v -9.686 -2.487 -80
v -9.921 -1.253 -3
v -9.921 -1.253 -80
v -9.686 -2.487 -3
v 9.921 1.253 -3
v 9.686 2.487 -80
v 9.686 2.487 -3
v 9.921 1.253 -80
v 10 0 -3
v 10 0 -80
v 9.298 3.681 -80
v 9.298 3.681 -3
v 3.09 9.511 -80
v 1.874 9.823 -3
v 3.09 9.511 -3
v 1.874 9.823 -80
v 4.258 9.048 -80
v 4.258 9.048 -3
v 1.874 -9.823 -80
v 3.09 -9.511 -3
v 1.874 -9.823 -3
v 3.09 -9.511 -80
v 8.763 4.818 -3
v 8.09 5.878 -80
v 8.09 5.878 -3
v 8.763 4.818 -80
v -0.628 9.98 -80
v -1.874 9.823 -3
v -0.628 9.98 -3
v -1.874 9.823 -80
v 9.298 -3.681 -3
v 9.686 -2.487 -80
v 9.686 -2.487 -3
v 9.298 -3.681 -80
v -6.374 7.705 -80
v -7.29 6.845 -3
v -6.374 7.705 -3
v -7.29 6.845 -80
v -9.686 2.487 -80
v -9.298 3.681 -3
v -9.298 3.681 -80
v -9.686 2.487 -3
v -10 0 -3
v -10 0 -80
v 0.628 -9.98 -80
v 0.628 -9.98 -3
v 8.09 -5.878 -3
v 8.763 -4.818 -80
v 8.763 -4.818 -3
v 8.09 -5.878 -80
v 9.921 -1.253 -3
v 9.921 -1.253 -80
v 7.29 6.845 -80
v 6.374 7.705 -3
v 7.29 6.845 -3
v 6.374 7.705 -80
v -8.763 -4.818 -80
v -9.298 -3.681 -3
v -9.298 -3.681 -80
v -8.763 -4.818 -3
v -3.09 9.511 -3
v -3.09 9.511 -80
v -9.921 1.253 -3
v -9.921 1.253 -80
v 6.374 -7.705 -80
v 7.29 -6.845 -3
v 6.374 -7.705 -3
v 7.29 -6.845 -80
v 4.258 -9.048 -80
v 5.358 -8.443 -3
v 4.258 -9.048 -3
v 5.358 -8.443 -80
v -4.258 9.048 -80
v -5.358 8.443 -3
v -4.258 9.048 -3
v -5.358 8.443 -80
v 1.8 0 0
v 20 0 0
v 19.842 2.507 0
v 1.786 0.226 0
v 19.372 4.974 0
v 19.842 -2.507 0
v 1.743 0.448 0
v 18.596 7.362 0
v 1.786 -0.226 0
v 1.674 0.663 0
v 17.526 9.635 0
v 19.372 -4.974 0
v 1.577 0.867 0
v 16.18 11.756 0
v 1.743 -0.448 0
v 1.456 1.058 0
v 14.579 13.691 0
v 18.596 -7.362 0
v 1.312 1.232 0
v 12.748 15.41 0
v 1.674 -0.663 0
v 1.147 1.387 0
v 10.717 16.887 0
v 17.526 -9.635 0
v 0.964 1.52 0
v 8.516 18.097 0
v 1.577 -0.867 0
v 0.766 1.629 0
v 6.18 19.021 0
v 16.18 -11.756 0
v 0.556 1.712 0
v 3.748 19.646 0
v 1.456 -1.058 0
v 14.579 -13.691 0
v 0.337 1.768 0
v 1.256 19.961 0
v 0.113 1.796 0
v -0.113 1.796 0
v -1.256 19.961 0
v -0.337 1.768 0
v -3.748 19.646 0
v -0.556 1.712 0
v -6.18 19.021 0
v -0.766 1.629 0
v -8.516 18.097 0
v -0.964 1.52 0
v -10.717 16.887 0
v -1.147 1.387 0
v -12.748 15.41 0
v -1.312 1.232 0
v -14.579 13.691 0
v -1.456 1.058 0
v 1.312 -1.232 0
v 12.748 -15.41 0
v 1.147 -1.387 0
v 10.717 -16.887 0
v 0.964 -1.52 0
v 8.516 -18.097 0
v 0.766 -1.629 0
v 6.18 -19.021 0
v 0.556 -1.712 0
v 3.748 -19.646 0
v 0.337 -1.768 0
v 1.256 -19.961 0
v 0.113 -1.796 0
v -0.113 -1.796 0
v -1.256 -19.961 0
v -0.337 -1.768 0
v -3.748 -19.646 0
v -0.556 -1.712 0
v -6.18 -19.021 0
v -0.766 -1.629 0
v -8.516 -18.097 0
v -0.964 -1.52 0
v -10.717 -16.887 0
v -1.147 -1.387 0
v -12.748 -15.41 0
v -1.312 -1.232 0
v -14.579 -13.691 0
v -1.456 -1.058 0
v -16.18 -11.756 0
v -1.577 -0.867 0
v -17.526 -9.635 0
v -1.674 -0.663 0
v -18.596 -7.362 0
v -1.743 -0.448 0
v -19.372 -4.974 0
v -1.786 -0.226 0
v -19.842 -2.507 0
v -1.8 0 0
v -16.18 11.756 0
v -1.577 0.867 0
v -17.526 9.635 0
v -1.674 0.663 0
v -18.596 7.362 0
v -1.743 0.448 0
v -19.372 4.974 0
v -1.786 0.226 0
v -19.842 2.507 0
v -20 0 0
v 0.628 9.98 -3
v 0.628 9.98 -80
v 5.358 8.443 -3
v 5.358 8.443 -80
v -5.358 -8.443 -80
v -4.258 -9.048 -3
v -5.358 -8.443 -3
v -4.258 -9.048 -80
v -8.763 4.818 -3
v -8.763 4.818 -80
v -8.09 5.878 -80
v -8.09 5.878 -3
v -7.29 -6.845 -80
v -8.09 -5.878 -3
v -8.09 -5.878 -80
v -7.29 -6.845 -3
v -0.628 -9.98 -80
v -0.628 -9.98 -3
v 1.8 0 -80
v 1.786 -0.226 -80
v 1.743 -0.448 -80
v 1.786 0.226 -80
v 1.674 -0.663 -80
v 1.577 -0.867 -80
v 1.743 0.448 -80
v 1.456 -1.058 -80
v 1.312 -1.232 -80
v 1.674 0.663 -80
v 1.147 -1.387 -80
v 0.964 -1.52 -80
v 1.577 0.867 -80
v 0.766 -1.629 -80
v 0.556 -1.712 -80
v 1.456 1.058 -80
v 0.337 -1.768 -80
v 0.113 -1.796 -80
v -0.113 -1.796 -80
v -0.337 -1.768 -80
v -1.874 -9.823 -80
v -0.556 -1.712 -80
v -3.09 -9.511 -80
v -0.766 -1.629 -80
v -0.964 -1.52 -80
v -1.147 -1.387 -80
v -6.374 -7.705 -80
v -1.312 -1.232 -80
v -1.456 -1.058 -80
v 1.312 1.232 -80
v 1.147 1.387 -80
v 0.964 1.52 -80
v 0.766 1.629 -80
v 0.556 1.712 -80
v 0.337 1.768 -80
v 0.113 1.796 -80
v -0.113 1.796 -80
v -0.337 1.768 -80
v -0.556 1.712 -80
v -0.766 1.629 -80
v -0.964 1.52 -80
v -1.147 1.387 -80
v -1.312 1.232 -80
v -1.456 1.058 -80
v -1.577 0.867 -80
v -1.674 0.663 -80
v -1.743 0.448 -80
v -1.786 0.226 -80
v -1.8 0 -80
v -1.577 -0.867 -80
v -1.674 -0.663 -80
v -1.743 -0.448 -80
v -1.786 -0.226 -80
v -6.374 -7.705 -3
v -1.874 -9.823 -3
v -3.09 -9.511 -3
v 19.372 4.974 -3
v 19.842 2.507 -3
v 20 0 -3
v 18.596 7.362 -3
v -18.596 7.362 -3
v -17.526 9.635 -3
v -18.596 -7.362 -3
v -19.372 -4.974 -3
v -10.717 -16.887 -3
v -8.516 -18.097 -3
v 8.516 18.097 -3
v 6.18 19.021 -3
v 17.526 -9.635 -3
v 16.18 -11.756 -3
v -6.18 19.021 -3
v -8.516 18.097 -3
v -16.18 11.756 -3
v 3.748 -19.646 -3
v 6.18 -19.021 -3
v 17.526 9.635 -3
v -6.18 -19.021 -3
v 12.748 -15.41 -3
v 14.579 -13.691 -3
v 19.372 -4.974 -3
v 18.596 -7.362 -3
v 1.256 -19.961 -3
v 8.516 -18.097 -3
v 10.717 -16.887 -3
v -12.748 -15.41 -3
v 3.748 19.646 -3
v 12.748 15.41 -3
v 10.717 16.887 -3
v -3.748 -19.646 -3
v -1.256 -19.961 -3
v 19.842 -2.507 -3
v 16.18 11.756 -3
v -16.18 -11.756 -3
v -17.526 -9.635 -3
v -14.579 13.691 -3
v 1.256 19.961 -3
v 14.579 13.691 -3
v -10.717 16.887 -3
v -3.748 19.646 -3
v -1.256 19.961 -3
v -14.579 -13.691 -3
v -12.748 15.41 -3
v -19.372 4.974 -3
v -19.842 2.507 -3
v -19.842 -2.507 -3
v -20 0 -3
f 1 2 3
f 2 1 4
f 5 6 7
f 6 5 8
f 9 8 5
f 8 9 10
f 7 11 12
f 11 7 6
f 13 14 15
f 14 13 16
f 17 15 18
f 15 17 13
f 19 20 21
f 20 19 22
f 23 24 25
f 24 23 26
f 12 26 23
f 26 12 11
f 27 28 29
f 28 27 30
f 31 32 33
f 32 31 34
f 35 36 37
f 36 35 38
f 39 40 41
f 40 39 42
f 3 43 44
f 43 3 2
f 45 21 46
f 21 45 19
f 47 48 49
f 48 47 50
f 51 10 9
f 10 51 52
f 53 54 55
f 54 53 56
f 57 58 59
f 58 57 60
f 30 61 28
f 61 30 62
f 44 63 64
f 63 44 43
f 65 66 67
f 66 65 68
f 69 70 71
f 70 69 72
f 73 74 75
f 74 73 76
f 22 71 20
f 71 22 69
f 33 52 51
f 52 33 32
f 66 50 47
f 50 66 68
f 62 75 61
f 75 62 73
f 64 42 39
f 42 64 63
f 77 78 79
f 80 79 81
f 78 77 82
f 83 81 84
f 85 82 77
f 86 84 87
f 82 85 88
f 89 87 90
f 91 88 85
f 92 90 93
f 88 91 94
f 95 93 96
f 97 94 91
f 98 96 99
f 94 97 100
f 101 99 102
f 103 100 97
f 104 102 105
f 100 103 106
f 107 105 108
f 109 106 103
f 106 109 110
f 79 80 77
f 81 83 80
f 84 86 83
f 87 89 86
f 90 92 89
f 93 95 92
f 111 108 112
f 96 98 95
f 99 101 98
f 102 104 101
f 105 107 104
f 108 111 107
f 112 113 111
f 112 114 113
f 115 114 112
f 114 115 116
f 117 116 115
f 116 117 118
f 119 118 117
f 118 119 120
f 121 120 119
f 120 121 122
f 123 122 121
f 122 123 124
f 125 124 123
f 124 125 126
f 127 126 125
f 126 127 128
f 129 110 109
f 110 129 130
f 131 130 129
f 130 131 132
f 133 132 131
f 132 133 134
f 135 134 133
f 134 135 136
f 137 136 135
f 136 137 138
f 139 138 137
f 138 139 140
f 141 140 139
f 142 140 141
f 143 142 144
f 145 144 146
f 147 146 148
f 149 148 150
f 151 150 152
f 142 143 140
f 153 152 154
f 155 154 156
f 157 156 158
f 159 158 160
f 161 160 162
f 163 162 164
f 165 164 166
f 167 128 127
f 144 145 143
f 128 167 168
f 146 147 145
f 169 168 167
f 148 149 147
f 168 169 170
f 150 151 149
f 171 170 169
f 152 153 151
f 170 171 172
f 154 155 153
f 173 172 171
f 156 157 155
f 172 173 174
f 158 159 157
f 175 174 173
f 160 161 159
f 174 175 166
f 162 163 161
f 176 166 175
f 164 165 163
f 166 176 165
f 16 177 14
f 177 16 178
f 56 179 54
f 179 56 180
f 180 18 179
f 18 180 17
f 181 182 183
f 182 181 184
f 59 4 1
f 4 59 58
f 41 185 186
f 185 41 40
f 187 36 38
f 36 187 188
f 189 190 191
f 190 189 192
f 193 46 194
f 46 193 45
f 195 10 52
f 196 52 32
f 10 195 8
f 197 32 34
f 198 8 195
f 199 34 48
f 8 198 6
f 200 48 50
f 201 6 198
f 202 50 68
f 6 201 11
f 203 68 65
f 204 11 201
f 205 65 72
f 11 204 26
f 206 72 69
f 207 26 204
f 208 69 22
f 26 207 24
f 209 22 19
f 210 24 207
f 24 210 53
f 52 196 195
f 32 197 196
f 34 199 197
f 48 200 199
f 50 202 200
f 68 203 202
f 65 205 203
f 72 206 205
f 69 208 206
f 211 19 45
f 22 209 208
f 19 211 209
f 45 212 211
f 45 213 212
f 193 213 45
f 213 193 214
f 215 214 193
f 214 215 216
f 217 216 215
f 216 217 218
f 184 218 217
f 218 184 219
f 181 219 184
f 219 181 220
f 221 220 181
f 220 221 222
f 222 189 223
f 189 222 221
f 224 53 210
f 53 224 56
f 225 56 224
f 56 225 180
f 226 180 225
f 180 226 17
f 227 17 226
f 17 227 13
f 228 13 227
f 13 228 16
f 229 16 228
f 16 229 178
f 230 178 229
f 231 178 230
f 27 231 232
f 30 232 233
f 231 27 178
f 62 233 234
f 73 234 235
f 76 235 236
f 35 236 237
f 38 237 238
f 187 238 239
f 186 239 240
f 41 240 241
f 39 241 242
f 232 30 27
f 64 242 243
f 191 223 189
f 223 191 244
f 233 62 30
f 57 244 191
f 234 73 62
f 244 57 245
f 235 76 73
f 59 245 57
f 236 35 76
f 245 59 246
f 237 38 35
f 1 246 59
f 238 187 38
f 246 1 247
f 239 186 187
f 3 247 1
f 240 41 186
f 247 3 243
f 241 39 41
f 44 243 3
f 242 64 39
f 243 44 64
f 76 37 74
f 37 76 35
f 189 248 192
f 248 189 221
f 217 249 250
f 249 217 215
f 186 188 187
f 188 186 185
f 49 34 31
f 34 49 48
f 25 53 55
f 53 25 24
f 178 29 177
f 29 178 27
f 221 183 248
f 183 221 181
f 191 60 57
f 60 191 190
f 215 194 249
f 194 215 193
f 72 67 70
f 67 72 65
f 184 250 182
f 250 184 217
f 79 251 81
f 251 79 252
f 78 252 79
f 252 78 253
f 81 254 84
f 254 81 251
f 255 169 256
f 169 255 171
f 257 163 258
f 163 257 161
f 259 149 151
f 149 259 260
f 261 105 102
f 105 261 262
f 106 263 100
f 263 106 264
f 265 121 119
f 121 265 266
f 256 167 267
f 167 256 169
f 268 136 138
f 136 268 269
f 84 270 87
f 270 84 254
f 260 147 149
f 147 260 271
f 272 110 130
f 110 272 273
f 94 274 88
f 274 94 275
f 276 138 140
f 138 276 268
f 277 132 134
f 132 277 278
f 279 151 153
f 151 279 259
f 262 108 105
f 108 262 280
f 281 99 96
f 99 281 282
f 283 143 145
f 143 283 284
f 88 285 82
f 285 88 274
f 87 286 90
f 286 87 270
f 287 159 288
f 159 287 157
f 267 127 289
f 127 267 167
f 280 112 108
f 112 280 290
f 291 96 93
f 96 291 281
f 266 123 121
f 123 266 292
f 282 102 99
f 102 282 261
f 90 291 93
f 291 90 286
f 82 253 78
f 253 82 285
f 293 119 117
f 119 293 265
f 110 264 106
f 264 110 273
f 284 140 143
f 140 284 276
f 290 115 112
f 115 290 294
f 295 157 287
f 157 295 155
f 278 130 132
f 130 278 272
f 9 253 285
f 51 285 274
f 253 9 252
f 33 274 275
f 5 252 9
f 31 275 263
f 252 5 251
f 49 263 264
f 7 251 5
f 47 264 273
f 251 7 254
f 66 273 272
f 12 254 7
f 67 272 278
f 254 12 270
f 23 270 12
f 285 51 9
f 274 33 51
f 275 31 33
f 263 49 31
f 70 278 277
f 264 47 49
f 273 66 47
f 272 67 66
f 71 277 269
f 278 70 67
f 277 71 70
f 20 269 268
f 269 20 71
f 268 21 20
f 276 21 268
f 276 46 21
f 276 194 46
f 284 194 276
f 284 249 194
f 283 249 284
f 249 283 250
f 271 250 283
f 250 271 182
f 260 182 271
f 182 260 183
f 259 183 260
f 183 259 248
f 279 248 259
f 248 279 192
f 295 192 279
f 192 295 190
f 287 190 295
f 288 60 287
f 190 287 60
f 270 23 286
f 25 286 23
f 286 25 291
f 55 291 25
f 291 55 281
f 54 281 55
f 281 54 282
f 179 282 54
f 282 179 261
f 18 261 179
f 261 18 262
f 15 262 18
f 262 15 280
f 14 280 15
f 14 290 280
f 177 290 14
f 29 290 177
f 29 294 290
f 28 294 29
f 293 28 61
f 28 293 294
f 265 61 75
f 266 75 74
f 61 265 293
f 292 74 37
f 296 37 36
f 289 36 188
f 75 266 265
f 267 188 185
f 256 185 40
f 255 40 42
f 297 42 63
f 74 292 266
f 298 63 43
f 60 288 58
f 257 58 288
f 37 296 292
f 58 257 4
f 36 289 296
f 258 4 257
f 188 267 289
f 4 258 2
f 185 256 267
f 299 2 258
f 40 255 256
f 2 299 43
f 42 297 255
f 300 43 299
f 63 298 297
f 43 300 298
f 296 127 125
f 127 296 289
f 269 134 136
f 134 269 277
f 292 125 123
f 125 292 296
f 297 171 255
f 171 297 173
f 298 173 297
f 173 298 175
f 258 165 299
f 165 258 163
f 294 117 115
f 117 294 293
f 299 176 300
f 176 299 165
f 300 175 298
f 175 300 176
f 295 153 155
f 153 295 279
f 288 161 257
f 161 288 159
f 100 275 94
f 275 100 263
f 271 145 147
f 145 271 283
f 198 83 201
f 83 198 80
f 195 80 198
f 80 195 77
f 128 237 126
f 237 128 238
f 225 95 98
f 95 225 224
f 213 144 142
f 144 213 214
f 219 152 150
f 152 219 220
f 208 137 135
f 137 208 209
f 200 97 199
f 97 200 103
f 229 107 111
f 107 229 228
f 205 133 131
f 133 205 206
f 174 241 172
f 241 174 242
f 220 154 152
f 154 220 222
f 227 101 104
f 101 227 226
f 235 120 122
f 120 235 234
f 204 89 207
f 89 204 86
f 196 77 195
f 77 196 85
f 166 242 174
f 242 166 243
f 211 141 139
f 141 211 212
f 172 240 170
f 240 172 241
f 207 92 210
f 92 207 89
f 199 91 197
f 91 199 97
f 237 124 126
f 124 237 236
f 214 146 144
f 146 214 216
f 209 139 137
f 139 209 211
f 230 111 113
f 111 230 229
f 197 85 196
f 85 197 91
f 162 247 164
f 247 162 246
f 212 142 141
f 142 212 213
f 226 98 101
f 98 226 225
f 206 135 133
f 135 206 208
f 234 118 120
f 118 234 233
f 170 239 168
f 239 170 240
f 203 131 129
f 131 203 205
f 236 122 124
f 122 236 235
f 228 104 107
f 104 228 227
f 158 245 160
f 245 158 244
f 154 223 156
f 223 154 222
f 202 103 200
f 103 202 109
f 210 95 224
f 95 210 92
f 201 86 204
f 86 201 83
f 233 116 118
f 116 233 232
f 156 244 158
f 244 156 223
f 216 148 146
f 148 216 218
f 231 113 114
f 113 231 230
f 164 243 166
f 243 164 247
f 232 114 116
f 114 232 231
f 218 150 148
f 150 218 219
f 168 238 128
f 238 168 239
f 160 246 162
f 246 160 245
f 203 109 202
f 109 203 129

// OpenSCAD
$fn = 50;


difference() {
	union() {
		translate(v = [0, 0, -80.0000000000]) {
			cylinder(h = 80, r = 10.0000000000);
		}
		translate(v = [0, 0, -3.0000000000]) {
			cylinder(h = 3, r = 20.0000000000);
		}
	}
	union() {
		#translate(v = [0, 0, -80]) {
			cylinder(h = 80, r = 1.8000000000);
		}
	}
}
